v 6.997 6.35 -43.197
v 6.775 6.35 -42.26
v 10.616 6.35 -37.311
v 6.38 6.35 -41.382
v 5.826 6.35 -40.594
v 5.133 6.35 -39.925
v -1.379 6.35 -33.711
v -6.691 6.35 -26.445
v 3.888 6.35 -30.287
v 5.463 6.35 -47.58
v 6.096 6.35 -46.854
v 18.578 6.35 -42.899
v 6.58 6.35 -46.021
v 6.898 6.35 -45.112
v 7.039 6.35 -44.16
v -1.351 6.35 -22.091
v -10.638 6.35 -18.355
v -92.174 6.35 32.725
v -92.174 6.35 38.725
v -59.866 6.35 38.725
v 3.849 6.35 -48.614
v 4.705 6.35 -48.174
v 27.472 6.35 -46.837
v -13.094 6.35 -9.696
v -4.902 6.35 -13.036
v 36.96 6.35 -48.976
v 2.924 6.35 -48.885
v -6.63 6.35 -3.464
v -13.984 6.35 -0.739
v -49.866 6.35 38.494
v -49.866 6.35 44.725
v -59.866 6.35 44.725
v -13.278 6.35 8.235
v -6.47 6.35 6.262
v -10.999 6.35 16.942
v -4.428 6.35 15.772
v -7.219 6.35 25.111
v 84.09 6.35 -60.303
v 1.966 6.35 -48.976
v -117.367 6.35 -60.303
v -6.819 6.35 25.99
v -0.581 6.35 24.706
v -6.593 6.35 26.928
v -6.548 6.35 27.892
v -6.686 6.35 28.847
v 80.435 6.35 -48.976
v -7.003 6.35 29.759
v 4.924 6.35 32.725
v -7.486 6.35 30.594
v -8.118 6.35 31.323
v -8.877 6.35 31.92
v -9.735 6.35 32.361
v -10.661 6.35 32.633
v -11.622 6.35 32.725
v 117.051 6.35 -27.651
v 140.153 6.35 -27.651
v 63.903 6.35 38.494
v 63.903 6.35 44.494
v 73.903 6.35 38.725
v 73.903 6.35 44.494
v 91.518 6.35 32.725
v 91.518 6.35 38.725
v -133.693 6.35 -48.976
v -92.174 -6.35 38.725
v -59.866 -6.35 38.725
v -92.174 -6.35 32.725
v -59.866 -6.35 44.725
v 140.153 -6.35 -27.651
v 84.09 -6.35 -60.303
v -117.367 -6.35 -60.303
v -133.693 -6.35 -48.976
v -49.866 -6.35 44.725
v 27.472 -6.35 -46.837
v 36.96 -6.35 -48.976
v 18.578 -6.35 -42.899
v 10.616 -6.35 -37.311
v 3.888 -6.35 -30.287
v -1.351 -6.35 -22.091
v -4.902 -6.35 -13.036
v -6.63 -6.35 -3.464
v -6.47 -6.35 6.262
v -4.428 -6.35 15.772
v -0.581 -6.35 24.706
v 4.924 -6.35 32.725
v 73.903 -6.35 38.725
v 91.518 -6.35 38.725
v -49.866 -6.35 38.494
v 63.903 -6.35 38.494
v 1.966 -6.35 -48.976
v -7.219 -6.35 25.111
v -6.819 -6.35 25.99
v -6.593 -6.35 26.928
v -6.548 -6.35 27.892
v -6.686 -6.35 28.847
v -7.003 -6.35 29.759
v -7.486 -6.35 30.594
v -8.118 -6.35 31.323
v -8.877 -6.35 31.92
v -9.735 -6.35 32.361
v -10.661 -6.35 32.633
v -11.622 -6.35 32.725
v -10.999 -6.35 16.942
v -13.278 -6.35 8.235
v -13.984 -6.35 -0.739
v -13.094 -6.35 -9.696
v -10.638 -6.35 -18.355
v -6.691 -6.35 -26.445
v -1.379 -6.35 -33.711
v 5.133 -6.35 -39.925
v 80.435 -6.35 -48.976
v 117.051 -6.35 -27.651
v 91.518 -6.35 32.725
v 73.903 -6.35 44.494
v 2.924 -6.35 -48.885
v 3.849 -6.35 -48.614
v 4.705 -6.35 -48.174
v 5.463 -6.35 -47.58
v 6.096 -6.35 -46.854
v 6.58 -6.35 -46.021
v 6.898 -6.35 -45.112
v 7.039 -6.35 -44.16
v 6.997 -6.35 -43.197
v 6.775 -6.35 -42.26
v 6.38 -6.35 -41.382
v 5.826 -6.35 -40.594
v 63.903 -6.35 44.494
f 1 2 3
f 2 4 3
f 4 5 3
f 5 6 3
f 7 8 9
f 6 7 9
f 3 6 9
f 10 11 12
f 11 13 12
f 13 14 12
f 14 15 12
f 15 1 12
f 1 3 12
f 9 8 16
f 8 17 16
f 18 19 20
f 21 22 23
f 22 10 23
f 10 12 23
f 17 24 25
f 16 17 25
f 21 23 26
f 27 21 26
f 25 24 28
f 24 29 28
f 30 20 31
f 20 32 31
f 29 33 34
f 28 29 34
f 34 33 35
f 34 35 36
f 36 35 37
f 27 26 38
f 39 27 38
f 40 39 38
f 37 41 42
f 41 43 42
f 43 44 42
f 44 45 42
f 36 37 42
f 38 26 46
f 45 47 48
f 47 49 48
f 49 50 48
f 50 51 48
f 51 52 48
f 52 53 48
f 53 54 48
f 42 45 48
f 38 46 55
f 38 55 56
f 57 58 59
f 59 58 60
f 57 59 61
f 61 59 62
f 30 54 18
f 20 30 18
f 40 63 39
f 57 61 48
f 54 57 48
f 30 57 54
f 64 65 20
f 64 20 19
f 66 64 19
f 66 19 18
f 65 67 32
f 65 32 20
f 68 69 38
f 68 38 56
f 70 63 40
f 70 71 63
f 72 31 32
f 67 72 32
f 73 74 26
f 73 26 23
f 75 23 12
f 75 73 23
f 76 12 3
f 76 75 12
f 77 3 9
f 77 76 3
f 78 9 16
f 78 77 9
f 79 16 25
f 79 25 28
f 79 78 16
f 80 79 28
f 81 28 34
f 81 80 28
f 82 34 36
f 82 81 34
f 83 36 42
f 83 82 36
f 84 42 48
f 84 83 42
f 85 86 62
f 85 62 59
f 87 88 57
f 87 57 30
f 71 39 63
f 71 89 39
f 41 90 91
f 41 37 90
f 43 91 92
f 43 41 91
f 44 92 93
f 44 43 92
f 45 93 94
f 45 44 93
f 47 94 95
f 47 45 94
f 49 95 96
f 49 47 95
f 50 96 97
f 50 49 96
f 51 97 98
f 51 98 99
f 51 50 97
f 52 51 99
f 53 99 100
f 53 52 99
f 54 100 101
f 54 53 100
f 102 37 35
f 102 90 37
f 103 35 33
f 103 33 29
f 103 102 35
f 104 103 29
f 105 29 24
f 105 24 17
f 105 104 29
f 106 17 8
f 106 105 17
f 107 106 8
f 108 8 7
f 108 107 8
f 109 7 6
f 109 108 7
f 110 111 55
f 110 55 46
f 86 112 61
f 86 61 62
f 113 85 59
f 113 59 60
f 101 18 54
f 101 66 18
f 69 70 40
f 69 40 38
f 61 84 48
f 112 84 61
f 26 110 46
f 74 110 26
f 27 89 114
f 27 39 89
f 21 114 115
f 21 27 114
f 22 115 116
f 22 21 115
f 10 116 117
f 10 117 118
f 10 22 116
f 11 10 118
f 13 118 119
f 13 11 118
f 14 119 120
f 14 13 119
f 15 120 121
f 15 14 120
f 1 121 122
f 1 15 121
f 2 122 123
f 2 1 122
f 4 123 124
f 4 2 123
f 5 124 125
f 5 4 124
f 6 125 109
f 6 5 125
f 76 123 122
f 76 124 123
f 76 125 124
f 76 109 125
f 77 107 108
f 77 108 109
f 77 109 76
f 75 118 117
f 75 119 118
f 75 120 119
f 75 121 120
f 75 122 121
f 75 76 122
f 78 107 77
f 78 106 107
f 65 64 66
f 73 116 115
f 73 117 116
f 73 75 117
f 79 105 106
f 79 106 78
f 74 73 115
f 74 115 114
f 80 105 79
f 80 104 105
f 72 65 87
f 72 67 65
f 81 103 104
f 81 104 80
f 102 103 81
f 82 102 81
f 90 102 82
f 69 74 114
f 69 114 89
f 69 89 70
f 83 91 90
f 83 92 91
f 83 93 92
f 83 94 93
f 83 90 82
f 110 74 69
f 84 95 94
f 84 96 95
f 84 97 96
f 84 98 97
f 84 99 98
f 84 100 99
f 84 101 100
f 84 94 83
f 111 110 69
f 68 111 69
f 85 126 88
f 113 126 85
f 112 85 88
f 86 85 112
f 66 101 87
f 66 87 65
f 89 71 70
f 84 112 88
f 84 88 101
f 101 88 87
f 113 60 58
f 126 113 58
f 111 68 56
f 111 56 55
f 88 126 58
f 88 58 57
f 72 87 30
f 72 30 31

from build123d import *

# Parameters (mm, degrees)
F1_DEPTH = 6.35
F2_R     = 5.08


with BuildPart() as f1:
    # F0 (on Front) → F1 (new body, symmetric)
    with BuildSketch(Plane.XZ):
        with BuildLine():
            Line((-133.693446, -48.976308), (-117.367371, -60.302993))
            Line((-117.367371, -60.302993), (84.090313, -60.302993))
            Line((84.090313, -60.302993), (140.153468, -27.65083))
            Line((140.153468, -27.65083), (117.05051, -27.65083))
            Line((117.05051, -27.65083), (80.435061, -48.976308))
            Line((80.435061, -48.976308), (36.960306, -48.976308))
            ThreePointArc((36.960306, -48.976308), (-3.347569, -17.650078), (4.924222, 32.724866))
            Line((4.924222, 32.724866), (91.518199, 32.724866))
            Line((91.518199, 32.724866), (91.518199, 38.724854))
            Line((91.518199, 38.724854), (73.902904, 38.724854))
            Line((73.902904, 38.724854), (73.902904, 44.494075))
            Line((73.902904, 44.494075), (63.902899, 44.494075))
            Line((63.902899, 44.494075), (63.902899, 38.494087))
            Line((63.902899, 38.494087), (-49.86607, 38.494087))
            Line((-49.86607, 38.494087), (-49.86607, 44.724842))
            Line((-49.86607, 44.724842), (-59.866076, 44.724842))
            Line((-59.866076, 44.724842), (-59.866076, 38.724854))
            Line((-59.866076, 38.724854), (-92.173692, 38.724854))
            Line((-92.173692, 38.724854), (-92.173692, 32.724866))
            Line((-92.173692, 32.724866), (-1.852643, 32.724866))
            ThreePointArc((-1.852643, 32.724866), (-11.856696, -14.771434), (22.581745, -48.976308))
            Line((22.581745, -48.976308), (-133.693446, -48.976308))
        make_face()
    extrude(amount=F1_DEPTH, both=True)

    # F2
    f2_edges = [f1.edges().sort_by_distance(p)[0] for p in [
        (22.581745, 0, -48.976308),
        (-1.852643, 0, 32.724866),
    ]]
    fillet(f2_edges, radius=F2_R)


solid = f1.part
